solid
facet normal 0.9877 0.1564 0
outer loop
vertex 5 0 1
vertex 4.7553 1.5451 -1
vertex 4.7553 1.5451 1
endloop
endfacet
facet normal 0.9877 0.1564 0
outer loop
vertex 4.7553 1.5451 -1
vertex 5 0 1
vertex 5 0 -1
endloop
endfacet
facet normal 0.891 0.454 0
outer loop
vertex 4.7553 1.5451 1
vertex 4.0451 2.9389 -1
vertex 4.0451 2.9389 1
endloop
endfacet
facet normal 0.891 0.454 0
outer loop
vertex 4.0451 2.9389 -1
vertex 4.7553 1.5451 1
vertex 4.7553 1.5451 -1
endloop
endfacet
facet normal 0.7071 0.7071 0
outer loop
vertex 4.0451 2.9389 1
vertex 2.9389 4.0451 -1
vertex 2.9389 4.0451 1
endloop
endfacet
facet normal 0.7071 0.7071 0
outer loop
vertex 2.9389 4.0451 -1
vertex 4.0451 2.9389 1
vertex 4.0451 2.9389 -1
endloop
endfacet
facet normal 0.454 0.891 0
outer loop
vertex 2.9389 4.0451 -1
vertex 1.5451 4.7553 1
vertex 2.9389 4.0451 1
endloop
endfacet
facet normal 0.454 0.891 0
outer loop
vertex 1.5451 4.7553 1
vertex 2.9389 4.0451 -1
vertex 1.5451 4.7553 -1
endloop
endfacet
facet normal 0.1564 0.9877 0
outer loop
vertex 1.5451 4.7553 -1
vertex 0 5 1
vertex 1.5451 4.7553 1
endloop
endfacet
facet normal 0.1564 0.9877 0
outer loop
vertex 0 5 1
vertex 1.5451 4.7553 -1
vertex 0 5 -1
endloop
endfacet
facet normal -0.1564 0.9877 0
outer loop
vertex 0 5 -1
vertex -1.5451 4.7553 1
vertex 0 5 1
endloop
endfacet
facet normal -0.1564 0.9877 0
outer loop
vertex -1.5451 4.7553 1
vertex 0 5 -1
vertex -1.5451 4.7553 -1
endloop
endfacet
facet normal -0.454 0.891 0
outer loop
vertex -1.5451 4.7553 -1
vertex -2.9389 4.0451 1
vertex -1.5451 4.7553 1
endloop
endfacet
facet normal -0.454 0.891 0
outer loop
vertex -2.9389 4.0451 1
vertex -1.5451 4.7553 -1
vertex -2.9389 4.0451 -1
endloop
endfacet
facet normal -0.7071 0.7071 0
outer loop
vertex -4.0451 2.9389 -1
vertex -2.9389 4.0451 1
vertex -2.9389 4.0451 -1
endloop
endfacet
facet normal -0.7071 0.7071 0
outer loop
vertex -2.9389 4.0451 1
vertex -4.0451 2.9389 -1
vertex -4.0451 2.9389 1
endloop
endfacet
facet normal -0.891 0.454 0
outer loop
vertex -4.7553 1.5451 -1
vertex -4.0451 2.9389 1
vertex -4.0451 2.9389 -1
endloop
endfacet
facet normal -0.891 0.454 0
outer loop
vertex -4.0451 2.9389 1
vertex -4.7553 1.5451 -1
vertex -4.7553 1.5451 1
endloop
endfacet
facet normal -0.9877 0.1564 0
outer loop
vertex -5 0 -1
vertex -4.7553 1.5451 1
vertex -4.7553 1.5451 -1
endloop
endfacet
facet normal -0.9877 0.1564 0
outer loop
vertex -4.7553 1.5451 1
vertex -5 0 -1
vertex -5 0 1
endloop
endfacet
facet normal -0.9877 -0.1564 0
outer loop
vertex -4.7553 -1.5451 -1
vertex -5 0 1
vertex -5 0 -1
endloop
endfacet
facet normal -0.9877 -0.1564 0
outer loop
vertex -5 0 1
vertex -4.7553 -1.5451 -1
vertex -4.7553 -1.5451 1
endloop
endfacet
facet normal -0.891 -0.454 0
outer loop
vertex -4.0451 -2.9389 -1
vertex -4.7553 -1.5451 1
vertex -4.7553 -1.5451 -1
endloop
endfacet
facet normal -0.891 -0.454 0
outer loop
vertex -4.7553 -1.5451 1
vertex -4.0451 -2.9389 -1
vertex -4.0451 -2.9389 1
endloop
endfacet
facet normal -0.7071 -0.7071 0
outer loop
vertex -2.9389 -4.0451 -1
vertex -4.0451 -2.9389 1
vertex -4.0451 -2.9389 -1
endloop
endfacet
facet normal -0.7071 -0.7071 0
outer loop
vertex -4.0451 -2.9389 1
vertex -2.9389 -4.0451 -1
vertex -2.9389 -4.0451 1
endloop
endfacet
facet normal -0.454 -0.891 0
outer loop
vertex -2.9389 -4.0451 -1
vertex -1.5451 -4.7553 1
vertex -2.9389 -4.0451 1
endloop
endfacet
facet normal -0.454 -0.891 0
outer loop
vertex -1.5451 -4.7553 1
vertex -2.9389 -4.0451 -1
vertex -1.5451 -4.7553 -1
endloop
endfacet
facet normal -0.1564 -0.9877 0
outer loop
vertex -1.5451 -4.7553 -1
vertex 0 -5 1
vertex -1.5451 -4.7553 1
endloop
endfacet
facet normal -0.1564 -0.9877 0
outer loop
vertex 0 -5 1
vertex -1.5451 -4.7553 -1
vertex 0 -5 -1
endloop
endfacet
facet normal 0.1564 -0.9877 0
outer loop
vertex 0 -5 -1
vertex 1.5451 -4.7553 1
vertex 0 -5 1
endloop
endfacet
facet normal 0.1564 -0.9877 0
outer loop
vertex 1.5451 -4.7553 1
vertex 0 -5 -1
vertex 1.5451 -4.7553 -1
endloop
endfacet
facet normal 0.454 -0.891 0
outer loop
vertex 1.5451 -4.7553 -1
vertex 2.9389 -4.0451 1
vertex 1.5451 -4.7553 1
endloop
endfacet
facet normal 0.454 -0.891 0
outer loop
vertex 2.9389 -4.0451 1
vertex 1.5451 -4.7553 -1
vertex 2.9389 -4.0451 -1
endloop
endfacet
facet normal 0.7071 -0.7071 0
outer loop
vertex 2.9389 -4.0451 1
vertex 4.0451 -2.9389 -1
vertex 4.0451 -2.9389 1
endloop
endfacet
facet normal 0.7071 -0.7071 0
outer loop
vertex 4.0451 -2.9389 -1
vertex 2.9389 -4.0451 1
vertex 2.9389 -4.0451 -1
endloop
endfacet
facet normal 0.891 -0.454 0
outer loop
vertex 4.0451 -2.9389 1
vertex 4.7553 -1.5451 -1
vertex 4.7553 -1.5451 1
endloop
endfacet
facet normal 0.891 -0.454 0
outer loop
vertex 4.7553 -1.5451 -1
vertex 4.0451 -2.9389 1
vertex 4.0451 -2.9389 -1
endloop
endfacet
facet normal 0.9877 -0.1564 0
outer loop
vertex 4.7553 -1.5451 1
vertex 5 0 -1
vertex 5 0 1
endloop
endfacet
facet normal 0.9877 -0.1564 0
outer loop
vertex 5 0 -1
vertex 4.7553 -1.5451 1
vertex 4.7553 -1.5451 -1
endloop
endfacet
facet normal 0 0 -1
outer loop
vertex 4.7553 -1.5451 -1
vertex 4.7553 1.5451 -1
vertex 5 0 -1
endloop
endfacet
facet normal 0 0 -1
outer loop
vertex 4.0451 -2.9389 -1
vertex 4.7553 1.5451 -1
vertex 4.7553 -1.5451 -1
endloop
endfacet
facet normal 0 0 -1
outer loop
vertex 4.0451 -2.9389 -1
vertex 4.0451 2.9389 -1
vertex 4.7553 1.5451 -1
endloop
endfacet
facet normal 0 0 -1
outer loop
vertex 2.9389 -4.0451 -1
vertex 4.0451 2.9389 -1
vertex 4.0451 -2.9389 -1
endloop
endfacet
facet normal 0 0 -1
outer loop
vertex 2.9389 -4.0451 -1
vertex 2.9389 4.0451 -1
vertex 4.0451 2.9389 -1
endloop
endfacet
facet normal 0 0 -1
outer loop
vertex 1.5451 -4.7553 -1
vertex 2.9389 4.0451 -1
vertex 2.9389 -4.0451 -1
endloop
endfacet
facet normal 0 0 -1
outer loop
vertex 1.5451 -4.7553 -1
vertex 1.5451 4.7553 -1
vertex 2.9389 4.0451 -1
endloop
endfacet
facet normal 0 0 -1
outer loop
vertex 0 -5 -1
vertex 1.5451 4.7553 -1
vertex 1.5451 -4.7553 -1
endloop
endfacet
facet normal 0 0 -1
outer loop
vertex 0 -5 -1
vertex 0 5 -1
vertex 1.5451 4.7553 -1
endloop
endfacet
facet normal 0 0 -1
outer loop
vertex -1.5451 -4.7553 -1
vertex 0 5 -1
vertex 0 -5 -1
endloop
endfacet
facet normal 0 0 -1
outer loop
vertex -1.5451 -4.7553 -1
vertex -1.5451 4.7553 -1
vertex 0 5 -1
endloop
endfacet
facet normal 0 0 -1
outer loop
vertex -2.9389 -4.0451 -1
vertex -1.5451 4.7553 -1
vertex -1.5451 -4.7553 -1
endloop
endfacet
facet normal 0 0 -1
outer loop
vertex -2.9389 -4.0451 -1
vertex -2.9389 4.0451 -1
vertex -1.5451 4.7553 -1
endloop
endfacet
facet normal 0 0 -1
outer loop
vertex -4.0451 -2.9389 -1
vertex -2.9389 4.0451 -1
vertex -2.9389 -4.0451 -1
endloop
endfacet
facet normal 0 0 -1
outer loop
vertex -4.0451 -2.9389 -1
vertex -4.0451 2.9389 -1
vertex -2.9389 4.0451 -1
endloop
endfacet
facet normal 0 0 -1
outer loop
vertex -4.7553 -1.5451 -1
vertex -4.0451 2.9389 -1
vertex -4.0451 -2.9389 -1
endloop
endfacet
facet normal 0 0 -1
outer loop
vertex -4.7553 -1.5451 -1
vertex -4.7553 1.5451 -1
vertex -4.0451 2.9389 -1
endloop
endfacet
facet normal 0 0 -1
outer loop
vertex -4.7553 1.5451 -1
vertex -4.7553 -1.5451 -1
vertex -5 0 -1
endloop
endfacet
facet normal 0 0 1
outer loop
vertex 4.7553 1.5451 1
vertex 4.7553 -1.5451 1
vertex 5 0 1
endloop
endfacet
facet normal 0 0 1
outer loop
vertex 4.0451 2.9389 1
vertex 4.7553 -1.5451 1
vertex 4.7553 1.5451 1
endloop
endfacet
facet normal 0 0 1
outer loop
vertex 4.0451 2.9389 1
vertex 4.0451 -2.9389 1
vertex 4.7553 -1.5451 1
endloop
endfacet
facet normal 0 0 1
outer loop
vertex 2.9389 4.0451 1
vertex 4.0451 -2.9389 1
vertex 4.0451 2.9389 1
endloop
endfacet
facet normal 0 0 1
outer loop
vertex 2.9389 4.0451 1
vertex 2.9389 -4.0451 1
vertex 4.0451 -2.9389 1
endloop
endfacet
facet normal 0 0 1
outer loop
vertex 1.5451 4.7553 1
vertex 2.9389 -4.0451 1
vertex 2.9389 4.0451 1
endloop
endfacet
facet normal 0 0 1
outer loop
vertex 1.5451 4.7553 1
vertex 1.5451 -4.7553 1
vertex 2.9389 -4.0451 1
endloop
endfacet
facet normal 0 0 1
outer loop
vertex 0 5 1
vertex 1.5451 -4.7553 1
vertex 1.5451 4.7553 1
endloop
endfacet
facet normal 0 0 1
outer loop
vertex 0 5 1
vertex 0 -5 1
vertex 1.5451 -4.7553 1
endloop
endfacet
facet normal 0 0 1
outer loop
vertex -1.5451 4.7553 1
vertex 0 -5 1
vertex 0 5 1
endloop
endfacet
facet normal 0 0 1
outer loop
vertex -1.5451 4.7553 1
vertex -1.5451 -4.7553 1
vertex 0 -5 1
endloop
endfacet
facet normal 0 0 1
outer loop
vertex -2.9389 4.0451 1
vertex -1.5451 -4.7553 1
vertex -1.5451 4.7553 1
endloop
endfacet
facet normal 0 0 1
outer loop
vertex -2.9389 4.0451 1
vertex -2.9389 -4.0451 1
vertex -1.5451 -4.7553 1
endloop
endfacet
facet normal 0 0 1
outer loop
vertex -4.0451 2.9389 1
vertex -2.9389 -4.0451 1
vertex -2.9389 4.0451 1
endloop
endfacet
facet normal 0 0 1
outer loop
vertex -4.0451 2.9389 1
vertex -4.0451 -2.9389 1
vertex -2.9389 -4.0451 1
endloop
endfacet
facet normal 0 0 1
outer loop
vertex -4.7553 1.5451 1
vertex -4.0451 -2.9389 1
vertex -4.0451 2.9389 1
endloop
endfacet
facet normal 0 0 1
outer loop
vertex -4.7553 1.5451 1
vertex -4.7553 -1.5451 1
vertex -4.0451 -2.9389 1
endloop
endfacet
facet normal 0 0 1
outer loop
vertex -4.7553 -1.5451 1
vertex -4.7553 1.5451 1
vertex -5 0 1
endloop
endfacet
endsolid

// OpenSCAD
	

	radius = 5;
	numTeeth = 10;
	toothDepth = 1.5;
	height = 2;
	gearAngle = 0.6;

	depth = 3.141592 * radius / numTeeth;

	cylinder(h = height, r=radius, $fn=20, center=true);

	for(i= [0 : numTeeth]){
		
		rotate([0,0,(i/numTeeth)*360]){
			
			translate([radius - 0.1 ,0,0]){
		
				rotate([0,90,0]){
					gear(height, toothDepth, depth, gearAngle);
				}
			}
		}
	}

	module myCube(depth, height, width){
		
		polyhedron(
  
		points=[ [height,depth,0],[height,-depth,0],[-height,-depth,0],[-height,depth,0],  // four points at base
           [height,depth,depth],[height,-depth,depth],[-height,-depth,depth],[-height,depth,depth] ],     // four points at top
  	
triangles=[ [0,1,2], [0,2,3], [0,4,5], [0,1,5], [1,5,2], [2,5,6], [2,3,6], [3,7,6], [0,3,4], [3,4,7], [4,5,7], [5,6,7] ]                         
 );

	}


	module gear(width, depth, height, ratio){

		halfWidth = width / 2;
		haldDepth = depth / 2;
		//halfHeight = height / 2;
		

	/*
		0 = [-halfWidth, -haldDepth, 0];
		1 = [halfWidth, -haldDepth, 0];
		2 = [halfWidth, haldDepth, 0];
		3 = [-halfWidth, haldDepth, 0];

		4 = [-halfWidth*ratio, -haldDepth, height];
		5 = [halfWidth*ratio, -haldDepth, height];
		6 = [halfWidth*ratio, haldDepth, height];
		7 = [-halfWidth*ratio, haldDepth, height];
	*/
		


		polyhedron( 

			points = [[-halfWidth, -haldDepth, 0],[halfWidth, -haldDepth, 0],[halfWidth, haldDepth, 0],[-halfWidth, haldDepth, 0],[-halfWidth, -haldDepth*ratio, height],[halfWidth, -haldDepth*ratio, height],[halfWidth, haldDepth*ratio, height], [-halfWidth, haldDepth*ratio, height]], 

		triangles = [ 

			[0,1,3], [1,2,3], 		//bottom
	
			[0,1,4], [1,4,5] ,		// frount side

			[1,2,5], [2,5,6], 		// right side

			[2,3,6], [3,6,7], 		// back side

			[0,3,4], [3,4,7],		// left side

			[4,5,7], [5,6,7]		// top

		
		]

		);




	}
	
